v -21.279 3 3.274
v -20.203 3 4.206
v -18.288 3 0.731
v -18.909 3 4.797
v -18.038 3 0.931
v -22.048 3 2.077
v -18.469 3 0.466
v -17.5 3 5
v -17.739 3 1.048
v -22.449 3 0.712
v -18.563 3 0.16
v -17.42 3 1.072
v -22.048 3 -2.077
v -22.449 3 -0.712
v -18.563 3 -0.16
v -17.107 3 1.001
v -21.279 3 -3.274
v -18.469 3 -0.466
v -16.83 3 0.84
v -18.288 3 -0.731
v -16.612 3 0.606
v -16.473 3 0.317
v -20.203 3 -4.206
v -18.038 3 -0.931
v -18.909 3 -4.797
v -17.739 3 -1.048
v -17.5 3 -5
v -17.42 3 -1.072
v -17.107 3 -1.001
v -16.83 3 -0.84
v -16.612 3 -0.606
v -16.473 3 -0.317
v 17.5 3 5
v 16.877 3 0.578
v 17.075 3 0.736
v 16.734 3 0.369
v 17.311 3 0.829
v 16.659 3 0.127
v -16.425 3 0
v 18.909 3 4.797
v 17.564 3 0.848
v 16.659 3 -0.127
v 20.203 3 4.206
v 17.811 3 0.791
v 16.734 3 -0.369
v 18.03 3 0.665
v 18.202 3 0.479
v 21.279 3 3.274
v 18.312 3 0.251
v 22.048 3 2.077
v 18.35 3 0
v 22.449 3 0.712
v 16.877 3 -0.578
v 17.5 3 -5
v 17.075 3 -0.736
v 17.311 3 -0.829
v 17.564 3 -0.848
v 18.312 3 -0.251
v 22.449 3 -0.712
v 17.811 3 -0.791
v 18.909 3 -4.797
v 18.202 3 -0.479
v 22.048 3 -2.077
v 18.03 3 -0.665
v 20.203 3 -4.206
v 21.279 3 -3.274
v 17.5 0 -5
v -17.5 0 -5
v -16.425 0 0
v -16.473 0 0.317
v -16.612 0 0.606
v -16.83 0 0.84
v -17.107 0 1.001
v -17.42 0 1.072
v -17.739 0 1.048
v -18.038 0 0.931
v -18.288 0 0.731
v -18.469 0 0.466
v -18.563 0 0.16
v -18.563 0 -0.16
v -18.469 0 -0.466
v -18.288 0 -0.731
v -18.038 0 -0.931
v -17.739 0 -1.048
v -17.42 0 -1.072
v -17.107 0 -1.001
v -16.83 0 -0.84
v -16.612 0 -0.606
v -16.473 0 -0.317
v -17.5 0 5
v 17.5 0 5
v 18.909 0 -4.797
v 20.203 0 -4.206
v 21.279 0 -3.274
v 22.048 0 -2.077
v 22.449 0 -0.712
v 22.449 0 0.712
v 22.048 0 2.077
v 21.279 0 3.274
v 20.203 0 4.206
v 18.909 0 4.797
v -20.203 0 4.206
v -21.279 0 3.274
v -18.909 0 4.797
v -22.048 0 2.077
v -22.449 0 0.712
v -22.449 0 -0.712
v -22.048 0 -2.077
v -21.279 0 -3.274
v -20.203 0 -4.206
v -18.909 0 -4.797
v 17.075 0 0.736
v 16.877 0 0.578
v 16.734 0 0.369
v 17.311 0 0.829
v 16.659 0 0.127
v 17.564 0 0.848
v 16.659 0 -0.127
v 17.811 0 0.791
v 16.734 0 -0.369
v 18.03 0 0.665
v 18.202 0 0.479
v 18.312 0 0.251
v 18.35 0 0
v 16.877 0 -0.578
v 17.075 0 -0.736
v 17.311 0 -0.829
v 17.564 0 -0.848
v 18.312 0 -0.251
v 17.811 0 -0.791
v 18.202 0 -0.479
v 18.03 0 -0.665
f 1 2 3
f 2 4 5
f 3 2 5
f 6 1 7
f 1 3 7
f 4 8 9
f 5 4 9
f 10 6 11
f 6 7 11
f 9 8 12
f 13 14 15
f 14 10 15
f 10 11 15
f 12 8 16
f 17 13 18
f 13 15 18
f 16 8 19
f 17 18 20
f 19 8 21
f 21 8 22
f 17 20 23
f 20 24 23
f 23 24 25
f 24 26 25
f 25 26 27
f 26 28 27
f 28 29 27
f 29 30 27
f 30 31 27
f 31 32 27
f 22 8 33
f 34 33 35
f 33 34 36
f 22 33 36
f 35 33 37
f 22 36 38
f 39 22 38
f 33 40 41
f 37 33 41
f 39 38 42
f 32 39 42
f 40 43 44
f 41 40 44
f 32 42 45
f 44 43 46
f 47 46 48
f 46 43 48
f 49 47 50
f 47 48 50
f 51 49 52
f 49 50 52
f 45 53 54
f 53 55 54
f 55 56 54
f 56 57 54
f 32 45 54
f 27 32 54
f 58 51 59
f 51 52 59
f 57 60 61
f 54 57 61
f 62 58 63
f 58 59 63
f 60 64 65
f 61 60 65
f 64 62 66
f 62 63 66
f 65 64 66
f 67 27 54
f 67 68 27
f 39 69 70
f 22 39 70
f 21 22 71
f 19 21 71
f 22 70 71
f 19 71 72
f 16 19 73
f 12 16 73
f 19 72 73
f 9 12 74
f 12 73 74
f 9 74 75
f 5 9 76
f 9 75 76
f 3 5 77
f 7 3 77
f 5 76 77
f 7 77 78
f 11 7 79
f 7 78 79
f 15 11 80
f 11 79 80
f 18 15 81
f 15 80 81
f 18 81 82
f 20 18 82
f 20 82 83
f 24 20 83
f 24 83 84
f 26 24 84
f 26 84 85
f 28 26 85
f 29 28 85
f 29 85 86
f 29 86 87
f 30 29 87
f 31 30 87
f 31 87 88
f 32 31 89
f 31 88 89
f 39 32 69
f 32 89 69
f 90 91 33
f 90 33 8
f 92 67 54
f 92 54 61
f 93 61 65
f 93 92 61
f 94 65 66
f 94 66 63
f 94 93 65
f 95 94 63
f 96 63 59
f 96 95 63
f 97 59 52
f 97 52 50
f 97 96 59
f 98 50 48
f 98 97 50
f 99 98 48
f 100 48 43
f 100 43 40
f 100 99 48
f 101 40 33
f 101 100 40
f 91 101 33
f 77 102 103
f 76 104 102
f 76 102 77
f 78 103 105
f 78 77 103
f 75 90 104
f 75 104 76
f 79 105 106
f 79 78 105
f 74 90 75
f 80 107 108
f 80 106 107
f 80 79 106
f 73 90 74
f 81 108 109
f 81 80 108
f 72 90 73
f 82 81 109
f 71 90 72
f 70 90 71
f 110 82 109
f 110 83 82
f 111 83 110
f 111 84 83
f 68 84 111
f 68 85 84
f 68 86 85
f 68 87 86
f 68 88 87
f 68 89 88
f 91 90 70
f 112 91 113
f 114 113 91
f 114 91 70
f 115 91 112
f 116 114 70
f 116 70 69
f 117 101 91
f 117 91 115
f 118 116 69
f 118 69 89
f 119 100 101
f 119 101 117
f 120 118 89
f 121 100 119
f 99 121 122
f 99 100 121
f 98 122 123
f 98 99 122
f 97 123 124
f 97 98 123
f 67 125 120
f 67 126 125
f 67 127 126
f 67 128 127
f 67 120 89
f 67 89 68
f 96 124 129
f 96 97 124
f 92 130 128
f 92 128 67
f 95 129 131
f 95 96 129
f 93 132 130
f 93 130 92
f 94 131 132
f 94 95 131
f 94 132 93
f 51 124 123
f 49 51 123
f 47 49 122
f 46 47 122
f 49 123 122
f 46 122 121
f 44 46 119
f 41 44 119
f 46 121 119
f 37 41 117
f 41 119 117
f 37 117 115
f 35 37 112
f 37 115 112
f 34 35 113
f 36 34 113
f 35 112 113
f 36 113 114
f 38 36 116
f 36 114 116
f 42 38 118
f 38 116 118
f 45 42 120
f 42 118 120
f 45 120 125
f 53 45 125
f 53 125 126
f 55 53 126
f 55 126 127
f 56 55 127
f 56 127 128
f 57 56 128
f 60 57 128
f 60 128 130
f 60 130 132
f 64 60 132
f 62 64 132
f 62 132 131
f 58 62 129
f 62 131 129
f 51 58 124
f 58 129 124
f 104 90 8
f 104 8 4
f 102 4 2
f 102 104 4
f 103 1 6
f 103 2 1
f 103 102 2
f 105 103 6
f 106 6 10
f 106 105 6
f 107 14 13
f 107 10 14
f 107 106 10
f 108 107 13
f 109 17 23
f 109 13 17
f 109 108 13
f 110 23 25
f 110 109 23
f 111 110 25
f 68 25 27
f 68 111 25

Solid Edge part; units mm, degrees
sketch "Sketch1" plane through (0, 0, 0) normal (0, -1, 0) x (1, 0, 0)
  line L0 (-17.5, -5) -> (17.5, -5)
  arc A0 (17.5, -5) -> (17.5, 5) centre (17.5, 0) ccw
  line L1 (17.5, 5) -> (-17.5, 5)
  arc A1 (-17.5, -5) -> (-17.5, 5) centre (-17.5, 0) cw
  dimension "D1" = 35
  dimension "D2" = 10
extrude "Ajout_matière_1" add sketch "Sketch1" against normal blind 3
sketch "Sketch2" plane through (0, 0, 0) normal (0, -1, 0) x (1, 0, 0)
  circle A0 centre (-17.5, 0) radius 1.075
  circle A1 centre (17.5, 0) radius 0.85
  dimension "D1" = 1.7
  dimension "D2" = 2.15
extrude "Enlèvement_matière_1" cut sketch "Sketch2" against normal blind 26.6987
properties part number "13" material "MDF 3mm"
